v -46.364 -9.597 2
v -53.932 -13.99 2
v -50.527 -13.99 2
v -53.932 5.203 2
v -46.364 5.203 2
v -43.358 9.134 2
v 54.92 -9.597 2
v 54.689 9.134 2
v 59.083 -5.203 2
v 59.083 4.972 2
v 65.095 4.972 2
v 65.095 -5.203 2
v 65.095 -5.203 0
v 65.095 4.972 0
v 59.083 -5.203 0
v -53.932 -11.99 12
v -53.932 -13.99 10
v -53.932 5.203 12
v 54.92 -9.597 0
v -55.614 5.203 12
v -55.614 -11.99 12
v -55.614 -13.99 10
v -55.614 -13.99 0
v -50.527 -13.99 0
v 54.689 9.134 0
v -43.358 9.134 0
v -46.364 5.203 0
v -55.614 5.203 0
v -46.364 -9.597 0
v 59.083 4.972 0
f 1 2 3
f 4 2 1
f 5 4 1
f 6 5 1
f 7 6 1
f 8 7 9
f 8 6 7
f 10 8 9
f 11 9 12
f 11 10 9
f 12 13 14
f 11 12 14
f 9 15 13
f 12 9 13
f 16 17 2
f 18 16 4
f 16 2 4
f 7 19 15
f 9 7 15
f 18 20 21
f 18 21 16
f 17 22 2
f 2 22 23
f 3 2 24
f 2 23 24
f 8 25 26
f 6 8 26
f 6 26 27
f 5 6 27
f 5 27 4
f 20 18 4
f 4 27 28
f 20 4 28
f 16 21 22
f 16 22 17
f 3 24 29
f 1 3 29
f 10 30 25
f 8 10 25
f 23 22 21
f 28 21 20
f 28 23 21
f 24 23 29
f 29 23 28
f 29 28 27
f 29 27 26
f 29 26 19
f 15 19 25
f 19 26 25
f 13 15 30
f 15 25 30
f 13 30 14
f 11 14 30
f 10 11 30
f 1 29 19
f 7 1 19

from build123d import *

# Parameters (mm, degrees)
F0_W     = 1.681574
F0_H     = 19.19315
F1_DEPTH = 12
F2_DEPTH = 2
F3_SIZE  = 2


with BuildPart() as f1:
    # F0 (on Top) → F1 (new body)
    with BuildSketch(Plane.XY):
        with Locations((-54.7731, -4.393613)):
            Rectangle(F0_W, F0_H)
    extrude(amount=F1_DEPTH)

    # F0 (on Top) → F2 (join)
    with BuildSketch(Plane.XY):
        Polygon((54.688916, 9.13409), (-43.35802, 9.13409), (-46.364177, 5.202962), (-53.932313, 5.202962), (-53.932313, -13.990188), (-50.526548, -13.990188), (-46.364177, -9.596575), (54.920163, -9.596575), (59.082527, -5.202962), (65.094844, -5.202962), (65.094844, 4.97172), (59.082527, 4.97172), align=None)
        with Locations((-54.7731, -4.393613)):
            Rectangle(F0_W, F0_H)
    extrude(amount=F2_DEPTH)

    # F3
    f3_edges = [f1.edges().sort_by_distance(p)[0] for p in [
        (-54.7731, -13.990188, 12),
    ]]
    chamfer(f3_edges, length=F3_SIZE)


solid = f1.part
